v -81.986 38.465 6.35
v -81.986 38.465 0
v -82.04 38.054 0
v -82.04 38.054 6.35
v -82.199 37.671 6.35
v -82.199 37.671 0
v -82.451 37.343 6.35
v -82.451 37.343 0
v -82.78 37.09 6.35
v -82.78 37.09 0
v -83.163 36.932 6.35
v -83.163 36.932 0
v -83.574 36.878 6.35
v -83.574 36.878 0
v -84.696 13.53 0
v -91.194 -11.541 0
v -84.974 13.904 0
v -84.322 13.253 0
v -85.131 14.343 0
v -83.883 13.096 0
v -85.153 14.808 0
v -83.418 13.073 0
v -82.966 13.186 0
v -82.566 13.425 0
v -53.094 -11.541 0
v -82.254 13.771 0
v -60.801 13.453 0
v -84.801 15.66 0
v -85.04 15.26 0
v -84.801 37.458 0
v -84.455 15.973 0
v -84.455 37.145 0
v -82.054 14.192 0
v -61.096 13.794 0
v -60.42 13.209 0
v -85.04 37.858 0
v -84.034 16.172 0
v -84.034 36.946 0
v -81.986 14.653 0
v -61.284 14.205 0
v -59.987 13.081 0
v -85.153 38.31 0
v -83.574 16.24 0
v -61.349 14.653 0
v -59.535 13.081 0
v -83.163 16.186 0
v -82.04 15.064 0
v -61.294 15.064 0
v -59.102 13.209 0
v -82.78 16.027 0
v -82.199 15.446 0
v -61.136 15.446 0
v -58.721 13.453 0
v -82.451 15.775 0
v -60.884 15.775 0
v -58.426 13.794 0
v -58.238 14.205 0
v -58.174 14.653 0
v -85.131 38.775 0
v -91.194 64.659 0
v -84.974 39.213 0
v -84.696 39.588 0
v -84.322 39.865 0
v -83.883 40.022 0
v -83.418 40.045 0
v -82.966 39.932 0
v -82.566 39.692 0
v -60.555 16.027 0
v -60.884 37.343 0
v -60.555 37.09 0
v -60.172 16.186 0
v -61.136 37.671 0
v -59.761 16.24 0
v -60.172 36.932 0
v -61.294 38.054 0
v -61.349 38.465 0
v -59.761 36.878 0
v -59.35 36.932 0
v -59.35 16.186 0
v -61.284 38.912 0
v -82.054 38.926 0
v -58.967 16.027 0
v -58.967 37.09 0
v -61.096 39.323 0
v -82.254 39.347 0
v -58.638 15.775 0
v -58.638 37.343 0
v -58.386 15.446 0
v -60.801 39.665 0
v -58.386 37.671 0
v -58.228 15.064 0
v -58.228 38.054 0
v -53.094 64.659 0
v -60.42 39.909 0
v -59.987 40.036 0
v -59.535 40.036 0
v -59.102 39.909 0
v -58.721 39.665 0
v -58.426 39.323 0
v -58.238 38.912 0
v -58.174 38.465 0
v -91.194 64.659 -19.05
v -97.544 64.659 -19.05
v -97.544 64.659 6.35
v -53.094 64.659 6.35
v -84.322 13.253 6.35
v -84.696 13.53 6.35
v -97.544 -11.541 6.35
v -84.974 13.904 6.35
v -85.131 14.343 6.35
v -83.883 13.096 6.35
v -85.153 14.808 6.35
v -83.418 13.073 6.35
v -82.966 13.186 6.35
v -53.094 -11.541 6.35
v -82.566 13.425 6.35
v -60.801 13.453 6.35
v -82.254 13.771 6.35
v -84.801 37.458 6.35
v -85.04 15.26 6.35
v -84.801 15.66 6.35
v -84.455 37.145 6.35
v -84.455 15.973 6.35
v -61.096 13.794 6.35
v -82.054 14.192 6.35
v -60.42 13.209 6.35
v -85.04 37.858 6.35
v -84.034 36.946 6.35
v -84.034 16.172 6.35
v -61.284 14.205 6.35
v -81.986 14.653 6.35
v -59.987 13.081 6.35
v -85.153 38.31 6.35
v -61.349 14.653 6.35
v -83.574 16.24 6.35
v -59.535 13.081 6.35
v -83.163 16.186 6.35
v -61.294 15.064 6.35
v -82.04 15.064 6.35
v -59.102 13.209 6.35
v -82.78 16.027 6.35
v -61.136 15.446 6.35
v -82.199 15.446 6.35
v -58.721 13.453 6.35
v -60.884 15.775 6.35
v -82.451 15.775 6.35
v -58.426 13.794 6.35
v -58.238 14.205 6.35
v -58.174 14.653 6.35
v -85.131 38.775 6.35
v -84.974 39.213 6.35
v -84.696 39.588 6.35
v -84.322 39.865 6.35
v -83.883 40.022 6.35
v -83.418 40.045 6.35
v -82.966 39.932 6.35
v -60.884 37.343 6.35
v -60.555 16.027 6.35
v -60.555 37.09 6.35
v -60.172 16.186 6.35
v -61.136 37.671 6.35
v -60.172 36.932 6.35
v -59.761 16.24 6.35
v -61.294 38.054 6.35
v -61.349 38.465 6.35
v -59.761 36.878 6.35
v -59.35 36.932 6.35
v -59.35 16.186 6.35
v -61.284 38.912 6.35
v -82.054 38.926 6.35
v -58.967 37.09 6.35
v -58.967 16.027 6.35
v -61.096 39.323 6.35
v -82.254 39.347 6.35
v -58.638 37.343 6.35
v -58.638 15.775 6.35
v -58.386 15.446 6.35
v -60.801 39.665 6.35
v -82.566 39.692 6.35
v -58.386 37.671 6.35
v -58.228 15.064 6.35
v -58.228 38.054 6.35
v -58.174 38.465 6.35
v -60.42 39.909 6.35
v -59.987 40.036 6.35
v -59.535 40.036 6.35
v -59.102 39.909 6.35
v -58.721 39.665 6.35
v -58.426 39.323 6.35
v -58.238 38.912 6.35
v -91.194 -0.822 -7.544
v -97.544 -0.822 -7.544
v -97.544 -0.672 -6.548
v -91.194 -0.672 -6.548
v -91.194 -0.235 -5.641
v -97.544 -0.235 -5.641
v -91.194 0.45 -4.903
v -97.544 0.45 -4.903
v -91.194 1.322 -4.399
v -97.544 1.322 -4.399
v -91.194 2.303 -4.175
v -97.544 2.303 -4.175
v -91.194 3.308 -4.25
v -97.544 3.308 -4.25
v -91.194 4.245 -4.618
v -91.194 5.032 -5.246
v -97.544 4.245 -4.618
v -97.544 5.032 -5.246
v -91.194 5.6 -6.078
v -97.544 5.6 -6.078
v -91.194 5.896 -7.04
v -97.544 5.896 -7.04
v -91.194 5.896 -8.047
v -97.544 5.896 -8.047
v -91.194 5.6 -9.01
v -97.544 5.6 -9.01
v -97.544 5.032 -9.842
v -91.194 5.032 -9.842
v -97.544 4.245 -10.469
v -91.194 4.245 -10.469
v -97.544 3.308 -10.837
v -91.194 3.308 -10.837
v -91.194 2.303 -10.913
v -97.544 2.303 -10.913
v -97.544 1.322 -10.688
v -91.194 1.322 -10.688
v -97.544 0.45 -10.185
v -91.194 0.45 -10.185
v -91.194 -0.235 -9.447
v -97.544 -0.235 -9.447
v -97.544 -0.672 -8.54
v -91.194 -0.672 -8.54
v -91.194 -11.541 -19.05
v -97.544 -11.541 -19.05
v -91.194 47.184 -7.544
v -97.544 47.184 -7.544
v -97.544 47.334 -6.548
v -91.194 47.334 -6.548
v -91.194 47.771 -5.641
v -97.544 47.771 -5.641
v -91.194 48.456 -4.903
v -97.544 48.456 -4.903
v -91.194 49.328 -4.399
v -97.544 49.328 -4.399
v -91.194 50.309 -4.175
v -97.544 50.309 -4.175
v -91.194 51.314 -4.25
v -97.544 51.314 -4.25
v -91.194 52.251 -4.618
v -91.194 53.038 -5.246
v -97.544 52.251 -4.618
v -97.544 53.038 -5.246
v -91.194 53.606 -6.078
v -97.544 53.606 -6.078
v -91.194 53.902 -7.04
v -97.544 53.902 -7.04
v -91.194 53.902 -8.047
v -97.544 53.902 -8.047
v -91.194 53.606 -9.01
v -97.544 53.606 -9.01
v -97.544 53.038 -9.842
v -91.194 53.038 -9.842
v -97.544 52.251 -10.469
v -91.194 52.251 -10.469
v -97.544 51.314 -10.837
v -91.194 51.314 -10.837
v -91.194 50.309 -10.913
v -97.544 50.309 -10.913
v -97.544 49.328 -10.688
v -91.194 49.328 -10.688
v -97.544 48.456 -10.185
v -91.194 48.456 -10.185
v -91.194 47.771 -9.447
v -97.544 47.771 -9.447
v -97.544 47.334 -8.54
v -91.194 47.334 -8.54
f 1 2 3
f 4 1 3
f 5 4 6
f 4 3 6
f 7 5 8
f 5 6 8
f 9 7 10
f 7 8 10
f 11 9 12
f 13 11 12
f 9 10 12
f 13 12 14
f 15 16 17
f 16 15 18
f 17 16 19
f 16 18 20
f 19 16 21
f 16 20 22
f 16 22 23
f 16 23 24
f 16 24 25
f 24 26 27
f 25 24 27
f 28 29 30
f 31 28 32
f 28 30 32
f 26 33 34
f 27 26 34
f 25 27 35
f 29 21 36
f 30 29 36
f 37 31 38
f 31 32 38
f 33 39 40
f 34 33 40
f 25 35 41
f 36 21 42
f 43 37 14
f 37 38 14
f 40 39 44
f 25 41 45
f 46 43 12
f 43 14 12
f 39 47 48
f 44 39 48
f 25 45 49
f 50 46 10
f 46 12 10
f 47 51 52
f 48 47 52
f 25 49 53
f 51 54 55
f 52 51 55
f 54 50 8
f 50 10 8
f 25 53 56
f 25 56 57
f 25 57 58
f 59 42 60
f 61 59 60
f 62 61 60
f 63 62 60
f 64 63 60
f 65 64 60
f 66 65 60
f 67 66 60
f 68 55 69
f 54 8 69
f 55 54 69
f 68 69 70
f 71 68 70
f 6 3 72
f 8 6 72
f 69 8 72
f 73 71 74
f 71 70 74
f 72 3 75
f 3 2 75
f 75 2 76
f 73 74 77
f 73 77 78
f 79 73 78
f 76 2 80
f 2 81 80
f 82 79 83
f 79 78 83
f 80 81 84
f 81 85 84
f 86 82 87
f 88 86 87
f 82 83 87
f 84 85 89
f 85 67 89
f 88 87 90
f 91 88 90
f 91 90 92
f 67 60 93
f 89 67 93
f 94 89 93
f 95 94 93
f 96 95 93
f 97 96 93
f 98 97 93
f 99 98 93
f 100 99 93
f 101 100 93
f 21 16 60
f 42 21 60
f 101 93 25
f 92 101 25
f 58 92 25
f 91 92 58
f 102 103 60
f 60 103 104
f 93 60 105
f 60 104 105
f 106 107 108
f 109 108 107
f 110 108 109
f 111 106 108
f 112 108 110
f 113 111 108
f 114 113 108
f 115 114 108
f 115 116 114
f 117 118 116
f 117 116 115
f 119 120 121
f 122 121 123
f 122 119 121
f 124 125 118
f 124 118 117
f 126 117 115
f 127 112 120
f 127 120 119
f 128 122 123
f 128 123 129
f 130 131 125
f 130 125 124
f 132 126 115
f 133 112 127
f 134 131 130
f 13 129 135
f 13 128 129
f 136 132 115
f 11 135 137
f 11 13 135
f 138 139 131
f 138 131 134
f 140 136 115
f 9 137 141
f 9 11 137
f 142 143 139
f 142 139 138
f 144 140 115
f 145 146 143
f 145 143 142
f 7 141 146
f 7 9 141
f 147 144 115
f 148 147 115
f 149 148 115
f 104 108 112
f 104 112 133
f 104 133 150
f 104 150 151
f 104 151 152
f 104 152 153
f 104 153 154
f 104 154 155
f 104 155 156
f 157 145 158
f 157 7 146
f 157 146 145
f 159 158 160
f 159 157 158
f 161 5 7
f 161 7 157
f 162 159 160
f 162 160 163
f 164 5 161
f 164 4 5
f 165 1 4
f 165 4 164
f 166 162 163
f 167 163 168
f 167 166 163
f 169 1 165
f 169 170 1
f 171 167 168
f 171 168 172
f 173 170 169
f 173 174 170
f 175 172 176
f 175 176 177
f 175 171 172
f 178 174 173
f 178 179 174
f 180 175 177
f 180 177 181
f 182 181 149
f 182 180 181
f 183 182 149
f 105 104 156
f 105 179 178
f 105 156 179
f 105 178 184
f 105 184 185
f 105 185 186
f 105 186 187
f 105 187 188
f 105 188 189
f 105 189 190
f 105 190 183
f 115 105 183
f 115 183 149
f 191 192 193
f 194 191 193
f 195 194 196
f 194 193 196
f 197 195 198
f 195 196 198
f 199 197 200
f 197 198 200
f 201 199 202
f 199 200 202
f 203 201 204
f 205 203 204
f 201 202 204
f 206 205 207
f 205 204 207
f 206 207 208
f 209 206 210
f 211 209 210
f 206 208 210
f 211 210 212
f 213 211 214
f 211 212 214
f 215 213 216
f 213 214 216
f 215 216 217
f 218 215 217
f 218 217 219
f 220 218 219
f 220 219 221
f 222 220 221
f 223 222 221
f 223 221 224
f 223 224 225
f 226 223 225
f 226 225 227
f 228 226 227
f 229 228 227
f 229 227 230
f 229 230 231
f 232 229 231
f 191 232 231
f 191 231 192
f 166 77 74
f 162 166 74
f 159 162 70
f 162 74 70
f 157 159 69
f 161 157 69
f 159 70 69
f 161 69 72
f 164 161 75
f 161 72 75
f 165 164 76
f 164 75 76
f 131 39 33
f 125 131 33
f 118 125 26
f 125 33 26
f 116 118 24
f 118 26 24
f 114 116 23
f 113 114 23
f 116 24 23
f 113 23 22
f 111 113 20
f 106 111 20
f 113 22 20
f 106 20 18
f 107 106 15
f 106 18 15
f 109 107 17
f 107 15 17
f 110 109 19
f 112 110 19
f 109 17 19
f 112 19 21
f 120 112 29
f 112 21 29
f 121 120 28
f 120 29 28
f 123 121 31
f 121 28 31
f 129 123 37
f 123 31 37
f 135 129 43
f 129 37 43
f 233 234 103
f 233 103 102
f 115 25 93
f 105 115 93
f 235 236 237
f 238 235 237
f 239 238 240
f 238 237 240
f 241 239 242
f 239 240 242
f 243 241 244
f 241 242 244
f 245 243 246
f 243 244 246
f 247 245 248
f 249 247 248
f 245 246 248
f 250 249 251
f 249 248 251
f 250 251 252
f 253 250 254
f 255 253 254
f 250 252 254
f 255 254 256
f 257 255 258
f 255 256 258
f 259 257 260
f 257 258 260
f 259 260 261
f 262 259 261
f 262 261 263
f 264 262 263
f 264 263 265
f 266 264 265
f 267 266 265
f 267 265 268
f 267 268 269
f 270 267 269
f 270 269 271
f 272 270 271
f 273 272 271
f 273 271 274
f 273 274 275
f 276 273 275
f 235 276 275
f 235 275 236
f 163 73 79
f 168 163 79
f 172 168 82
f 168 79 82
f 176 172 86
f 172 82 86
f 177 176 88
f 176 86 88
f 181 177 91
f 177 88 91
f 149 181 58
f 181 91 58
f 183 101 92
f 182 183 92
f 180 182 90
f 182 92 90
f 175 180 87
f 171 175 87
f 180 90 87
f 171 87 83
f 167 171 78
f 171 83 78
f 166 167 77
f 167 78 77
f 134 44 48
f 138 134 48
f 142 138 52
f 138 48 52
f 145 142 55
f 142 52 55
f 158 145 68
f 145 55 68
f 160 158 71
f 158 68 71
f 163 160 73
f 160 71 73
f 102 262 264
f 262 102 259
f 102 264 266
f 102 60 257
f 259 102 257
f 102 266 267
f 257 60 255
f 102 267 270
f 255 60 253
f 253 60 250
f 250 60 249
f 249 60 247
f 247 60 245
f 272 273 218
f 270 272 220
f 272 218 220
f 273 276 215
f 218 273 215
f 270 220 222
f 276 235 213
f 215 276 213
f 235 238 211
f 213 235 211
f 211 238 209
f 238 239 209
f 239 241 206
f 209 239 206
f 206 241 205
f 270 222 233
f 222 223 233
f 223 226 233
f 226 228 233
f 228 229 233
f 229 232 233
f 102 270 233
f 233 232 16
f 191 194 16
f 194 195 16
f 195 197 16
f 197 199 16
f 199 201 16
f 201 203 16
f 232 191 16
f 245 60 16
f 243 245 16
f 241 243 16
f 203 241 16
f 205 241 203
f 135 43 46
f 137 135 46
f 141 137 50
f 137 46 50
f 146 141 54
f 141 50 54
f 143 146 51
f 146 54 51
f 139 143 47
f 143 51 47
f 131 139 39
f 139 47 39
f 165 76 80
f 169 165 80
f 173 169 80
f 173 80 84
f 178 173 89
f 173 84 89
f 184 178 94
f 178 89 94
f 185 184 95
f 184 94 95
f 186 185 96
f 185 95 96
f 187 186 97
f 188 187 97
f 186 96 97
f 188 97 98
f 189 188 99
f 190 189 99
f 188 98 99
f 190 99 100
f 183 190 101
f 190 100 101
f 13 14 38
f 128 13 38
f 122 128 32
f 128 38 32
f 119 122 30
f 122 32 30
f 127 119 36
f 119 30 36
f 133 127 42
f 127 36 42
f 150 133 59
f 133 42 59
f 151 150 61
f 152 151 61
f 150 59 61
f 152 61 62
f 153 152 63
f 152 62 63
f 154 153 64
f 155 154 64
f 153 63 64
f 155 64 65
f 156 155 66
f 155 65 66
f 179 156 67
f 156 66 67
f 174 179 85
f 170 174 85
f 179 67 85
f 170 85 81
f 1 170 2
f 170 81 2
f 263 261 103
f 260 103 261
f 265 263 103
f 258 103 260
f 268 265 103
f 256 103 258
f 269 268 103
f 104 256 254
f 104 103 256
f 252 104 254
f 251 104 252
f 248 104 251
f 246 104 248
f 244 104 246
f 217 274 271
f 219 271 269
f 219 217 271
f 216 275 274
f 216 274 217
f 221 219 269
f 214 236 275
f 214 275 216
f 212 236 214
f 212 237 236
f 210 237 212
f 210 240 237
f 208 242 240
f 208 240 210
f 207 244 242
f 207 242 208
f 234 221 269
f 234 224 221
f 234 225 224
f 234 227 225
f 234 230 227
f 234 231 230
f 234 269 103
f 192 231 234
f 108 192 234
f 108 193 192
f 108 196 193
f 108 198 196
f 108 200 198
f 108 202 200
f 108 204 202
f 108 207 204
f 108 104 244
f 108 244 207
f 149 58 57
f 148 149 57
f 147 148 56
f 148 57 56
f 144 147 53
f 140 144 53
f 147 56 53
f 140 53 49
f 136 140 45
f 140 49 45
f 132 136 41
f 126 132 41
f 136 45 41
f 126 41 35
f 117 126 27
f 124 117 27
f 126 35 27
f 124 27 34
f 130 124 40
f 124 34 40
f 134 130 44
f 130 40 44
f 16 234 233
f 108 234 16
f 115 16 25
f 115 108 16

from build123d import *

# Parameters (mm, degrees)
F0_W     = 44.45
F0_H     = 76.2
F1_DEPTH = 6.35
F2_W     = 6.35
F2_H     = 76.2
F3_DEPTH = 19.05
F4_R     = 3.3782
F5_DEPTH = 12.7
F7_DEPTH = 25.4


with BuildPart() as f1:
    # F0 (on Top) → F1 (new body)
    with BuildSketch(Plane.XY):
        with Locations((-75.31851, 26.558877)):
            Rectangle(F0_W, F0_H)
    extrude(amount=F1_DEPTH)

    # F2 (on face) → F3 (join)
    with BuildSketch(Plane(origin=(0, 0, 0), x_dir=(1, 0, 0), z_dir=(0, 0, -1))):
        with Locations((-94.36851, -26.558877)):
            Rectangle(F2_W, F2_H)
    extrude(amount=F3_DEPTH)

    # F4 (on face) → F5 (cut)
    with BuildSketch(Plane(origin=(-97.54351, 0, 0), x_dir=(0, -1, 0), z_dir=(-1, 0, 0))):
        with Locations((-2.555877, -7.5438)):
            Circle(F4_R)
        with Locations((-50.561877, -7.5438)):
            Circle(F4_R)
    extrude(amount=-F5_DEPTH, mode=Mode.SUBTRACT)

    # F6 (on face) → F7 (cut)
    with BuildSketch(Plane(origin=(0, 0, 0), x_dir=(1, 0, 0), z_dir=(0, 0, -1))):
        with BuildLine():
            ThreePointArc((-83.57351, -16.240127), (-82.450978, -15.775159), (-81.98601, -14.652627))
            Line((-81.98601, -14.652627), (-83.57351, -14.652627))
            Line((-83.57351, -14.652627), (-83.57351, -16.240127))
        make_face()
        with BuildLine():
            Line((-83.57351, -14.652627), (-81.98601, -14.652627))
            ThreePointArc((-81.98601, -14.652627), (-84.696042, -13.530094), (-83.57351, -16.240127))
            Line((-83.57351, -16.240127), (-83.57351, -14.652627))
        make_face()
        with BuildLine():
            Line((-59.76101, -14.652627), (-61.34851, -14.652627))
            ThreePointArc((-61.34851, -14.652627), (-60.883542, -15.775159), (-59.76101, -16.240127))
            Line((-59.76101, -16.240127), (-59.76101, -14.652627))
        make_face()
        with BuildLine():
            ThreePointArc((-58.17351, -14.652627), (-59.76101, -13.065127), (-61.34851, -14.652627))
            Line((-61.34851, -14.652627), (-59.76101, -14.652627))
            Line((-59.76101, -14.652627), (-59.76101, -16.240127))
            ThreePointArc((-59.76101, -16.240127), (-58.638478, -15.775159), (-58.17351, -14.652627))
        make_face()
        with BuildLine():
            Line((-83.57351, -38.465127), (-83.57351, -36.877627))
            ThreePointArc((-83.57351, -36.877627), (-84.696042, -39.587659), (-81.98601, -38.465127))
            Line((-81.98601, -38.465127), (-83.57351, -38.465127))
        make_face()
        with BuildLine():
            ThreePointArc((-81.98601, -38.465127), (-82.450978, -37.342594), (-83.57351, -36.877627))
            Line((-83.57351, -36.877627), (-83.57351, -38.465127))
            Line((-83.57351, -38.465127), (-81.98601, -38.465127))
        make_face()
        with BuildLine():
            ThreePointArc((-58.17351, -38.465127), (-58.638478, -37.342594), (-59.76101, -36.877627))
            Line((-59.76101, -36.877627), (-59.76101, -38.465127))
            Line((-59.76101, -38.465127), (-61.34851, -38.465127))
            ThreePointArc((-61.34851, -38.465127), (-59.76101, -40.052627), (-58.17351, -38.465127))
        make_face()
        with BuildLine():
            Line((-59.76101, -38.465127), (-59.76101, -36.877627))
            ThreePointArc((-59.76101, -36.877627), (-60.883542, -37.342594), (-61.34851, -38.465127))
            Line((-61.34851, -38.465127), (-59.76101, -38.465127))
        make_face()
    extrude(amount=-F7_DEPTH, mode=Mode.SUBTRACT)


solid = f1.part
